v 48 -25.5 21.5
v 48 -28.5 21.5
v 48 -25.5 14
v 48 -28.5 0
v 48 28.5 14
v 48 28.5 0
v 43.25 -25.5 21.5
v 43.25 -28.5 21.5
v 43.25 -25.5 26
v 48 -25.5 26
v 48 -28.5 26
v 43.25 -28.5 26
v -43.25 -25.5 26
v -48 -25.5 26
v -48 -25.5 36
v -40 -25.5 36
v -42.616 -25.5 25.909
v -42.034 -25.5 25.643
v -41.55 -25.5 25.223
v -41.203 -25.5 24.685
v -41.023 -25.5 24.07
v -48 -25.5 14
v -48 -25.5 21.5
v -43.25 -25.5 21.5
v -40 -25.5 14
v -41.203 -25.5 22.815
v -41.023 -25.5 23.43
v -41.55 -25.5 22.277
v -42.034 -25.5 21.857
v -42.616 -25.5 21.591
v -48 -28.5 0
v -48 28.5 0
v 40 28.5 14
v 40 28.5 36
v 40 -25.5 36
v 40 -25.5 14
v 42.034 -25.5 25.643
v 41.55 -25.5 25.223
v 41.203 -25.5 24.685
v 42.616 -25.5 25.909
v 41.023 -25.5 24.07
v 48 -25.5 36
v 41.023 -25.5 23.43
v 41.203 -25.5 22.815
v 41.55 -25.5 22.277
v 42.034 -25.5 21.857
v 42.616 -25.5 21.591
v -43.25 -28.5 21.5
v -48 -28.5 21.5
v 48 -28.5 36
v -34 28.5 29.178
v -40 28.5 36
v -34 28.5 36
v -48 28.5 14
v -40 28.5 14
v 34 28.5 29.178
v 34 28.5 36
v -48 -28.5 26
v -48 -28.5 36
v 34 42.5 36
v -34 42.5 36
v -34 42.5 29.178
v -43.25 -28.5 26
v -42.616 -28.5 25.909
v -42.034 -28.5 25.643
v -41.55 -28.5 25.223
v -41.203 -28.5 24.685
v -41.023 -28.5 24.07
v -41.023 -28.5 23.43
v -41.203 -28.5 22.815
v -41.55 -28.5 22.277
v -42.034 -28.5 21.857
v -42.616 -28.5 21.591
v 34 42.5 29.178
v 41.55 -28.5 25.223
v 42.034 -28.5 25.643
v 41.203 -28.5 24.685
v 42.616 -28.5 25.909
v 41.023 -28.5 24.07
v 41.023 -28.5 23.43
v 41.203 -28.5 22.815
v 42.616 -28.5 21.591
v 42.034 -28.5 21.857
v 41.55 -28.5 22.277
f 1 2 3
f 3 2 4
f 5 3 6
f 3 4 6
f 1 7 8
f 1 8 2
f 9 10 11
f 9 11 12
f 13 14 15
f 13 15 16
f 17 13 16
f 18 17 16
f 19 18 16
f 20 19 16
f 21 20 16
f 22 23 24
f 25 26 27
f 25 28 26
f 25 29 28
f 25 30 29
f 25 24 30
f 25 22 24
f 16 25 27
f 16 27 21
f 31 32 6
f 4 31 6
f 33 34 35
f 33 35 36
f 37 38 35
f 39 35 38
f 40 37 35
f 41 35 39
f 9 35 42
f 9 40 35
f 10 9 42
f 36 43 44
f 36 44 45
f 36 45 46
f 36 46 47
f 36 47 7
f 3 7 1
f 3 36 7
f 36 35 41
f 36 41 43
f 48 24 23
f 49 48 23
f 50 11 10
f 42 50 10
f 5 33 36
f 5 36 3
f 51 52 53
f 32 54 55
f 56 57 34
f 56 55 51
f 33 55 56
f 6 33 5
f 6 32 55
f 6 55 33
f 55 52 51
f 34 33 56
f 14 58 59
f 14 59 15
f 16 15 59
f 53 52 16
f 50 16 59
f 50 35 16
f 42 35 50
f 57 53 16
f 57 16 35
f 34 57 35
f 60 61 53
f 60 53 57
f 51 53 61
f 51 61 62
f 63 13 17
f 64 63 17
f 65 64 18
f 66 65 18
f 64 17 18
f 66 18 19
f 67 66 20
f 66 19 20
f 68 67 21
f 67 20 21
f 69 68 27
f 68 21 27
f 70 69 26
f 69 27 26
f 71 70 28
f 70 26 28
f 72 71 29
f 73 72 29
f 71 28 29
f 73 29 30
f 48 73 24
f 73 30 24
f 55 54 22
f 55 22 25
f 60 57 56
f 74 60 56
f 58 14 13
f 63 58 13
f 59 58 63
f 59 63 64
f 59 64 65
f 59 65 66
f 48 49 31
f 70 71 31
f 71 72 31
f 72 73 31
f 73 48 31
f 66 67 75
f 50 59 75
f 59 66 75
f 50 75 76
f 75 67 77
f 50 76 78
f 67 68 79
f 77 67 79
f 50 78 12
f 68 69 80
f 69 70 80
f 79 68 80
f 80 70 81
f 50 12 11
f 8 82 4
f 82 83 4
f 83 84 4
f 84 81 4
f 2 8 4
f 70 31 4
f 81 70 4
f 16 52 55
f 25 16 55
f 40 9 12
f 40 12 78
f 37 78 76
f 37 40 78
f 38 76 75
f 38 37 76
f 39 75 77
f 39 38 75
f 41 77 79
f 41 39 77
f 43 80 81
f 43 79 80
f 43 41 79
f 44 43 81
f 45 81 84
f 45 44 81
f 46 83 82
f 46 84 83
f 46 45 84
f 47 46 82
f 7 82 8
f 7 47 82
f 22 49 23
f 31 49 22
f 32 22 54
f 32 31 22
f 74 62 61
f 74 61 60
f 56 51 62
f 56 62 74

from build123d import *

# Parameters (mm, degrees)
SKETCH_1_W          = 96
SKETCH_1_H          = 57
EXTRUDE_1_DEPTH     = 36
SKETCH_2_W          = 8
SKETCH_2_H          = 22
CUT_EXTRUDE_1_DEPTH = 54
CUT_EXTRUDE_2_DEPTH = 54
SKETCH_5_W          = 68
SKETCH_5_H          = 6.822468225
EXTRUDE_2_DEPTH     = 14


with BuildPart() as part:
    # 스케치1 → 보스-돌출1 (new body)
    with BuildSketch(Plane.XY):
        Rectangle(SKETCH_1_W, SKETCH_1_H)
    extrude(amount=EXTRUDE_1_DEPTH)

    # 스케치2 → 컷-돌출1 (cut)
    with BuildSketch(Plane(origin=(0, 28.5, 0), x_dir=(1, 0, 0), z_dir=(0, 1, 0))):
        with Locations((-44, -25)):
            Rectangle(SKETCH_2_W, SKETCH_2_H)
        with Locations((44, -25)):
            Rectangle(SKETCH_2_W, SKETCH_2_H)
    extrude(amount=-CUT_EXTRUDE_1_DEPTH, mode=Mode.SUBTRACT)

    # 스케치4 → 컷-돌출2 (cut)
    with BuildSketch(Plane(origin=(0, -25.5, 0), x_dir=(1, 0, 0), z_dir=(0, 1, 0))):
        with BuildLine():
            Line((48, -26), (43.25, -26))
            ThreePointArc((43.25, -26), (41, -23.75), (43.25, -21.5))
            Line((43.25, -21.5), (48, -21.5))
            Line((48, -21.5), (48, -26))
        make_face()
    cut_extrude_2 = extrude(amount=-CUT_EXTRUDE_2_DEPTH, mode=Mode.SUBTRACT)

    # 대칭 복사1: 컷-돌출2 across plane
    add(cut_extrude_2.mirror(Plane(origin=(0, 0, 0), x_dir=(0, 0, 1), z_dir=(1, 0, 0))), mode=Mode.SUBTRACT)

    # 스케치5 → 보스-돌출2 (add)
    with BuildSketch(Plane(origin=(0, 28.5, 0), x_dir=(1, 0, 0), z_dir=(0, 1, 0))):
        with Locations((0, -32.588765888)):
            Rectangle(SKETCH_5_W, SKETCH_5_H)
    extrude(amount=EXTRUDE_2_DEPTH)


solid = part.part
